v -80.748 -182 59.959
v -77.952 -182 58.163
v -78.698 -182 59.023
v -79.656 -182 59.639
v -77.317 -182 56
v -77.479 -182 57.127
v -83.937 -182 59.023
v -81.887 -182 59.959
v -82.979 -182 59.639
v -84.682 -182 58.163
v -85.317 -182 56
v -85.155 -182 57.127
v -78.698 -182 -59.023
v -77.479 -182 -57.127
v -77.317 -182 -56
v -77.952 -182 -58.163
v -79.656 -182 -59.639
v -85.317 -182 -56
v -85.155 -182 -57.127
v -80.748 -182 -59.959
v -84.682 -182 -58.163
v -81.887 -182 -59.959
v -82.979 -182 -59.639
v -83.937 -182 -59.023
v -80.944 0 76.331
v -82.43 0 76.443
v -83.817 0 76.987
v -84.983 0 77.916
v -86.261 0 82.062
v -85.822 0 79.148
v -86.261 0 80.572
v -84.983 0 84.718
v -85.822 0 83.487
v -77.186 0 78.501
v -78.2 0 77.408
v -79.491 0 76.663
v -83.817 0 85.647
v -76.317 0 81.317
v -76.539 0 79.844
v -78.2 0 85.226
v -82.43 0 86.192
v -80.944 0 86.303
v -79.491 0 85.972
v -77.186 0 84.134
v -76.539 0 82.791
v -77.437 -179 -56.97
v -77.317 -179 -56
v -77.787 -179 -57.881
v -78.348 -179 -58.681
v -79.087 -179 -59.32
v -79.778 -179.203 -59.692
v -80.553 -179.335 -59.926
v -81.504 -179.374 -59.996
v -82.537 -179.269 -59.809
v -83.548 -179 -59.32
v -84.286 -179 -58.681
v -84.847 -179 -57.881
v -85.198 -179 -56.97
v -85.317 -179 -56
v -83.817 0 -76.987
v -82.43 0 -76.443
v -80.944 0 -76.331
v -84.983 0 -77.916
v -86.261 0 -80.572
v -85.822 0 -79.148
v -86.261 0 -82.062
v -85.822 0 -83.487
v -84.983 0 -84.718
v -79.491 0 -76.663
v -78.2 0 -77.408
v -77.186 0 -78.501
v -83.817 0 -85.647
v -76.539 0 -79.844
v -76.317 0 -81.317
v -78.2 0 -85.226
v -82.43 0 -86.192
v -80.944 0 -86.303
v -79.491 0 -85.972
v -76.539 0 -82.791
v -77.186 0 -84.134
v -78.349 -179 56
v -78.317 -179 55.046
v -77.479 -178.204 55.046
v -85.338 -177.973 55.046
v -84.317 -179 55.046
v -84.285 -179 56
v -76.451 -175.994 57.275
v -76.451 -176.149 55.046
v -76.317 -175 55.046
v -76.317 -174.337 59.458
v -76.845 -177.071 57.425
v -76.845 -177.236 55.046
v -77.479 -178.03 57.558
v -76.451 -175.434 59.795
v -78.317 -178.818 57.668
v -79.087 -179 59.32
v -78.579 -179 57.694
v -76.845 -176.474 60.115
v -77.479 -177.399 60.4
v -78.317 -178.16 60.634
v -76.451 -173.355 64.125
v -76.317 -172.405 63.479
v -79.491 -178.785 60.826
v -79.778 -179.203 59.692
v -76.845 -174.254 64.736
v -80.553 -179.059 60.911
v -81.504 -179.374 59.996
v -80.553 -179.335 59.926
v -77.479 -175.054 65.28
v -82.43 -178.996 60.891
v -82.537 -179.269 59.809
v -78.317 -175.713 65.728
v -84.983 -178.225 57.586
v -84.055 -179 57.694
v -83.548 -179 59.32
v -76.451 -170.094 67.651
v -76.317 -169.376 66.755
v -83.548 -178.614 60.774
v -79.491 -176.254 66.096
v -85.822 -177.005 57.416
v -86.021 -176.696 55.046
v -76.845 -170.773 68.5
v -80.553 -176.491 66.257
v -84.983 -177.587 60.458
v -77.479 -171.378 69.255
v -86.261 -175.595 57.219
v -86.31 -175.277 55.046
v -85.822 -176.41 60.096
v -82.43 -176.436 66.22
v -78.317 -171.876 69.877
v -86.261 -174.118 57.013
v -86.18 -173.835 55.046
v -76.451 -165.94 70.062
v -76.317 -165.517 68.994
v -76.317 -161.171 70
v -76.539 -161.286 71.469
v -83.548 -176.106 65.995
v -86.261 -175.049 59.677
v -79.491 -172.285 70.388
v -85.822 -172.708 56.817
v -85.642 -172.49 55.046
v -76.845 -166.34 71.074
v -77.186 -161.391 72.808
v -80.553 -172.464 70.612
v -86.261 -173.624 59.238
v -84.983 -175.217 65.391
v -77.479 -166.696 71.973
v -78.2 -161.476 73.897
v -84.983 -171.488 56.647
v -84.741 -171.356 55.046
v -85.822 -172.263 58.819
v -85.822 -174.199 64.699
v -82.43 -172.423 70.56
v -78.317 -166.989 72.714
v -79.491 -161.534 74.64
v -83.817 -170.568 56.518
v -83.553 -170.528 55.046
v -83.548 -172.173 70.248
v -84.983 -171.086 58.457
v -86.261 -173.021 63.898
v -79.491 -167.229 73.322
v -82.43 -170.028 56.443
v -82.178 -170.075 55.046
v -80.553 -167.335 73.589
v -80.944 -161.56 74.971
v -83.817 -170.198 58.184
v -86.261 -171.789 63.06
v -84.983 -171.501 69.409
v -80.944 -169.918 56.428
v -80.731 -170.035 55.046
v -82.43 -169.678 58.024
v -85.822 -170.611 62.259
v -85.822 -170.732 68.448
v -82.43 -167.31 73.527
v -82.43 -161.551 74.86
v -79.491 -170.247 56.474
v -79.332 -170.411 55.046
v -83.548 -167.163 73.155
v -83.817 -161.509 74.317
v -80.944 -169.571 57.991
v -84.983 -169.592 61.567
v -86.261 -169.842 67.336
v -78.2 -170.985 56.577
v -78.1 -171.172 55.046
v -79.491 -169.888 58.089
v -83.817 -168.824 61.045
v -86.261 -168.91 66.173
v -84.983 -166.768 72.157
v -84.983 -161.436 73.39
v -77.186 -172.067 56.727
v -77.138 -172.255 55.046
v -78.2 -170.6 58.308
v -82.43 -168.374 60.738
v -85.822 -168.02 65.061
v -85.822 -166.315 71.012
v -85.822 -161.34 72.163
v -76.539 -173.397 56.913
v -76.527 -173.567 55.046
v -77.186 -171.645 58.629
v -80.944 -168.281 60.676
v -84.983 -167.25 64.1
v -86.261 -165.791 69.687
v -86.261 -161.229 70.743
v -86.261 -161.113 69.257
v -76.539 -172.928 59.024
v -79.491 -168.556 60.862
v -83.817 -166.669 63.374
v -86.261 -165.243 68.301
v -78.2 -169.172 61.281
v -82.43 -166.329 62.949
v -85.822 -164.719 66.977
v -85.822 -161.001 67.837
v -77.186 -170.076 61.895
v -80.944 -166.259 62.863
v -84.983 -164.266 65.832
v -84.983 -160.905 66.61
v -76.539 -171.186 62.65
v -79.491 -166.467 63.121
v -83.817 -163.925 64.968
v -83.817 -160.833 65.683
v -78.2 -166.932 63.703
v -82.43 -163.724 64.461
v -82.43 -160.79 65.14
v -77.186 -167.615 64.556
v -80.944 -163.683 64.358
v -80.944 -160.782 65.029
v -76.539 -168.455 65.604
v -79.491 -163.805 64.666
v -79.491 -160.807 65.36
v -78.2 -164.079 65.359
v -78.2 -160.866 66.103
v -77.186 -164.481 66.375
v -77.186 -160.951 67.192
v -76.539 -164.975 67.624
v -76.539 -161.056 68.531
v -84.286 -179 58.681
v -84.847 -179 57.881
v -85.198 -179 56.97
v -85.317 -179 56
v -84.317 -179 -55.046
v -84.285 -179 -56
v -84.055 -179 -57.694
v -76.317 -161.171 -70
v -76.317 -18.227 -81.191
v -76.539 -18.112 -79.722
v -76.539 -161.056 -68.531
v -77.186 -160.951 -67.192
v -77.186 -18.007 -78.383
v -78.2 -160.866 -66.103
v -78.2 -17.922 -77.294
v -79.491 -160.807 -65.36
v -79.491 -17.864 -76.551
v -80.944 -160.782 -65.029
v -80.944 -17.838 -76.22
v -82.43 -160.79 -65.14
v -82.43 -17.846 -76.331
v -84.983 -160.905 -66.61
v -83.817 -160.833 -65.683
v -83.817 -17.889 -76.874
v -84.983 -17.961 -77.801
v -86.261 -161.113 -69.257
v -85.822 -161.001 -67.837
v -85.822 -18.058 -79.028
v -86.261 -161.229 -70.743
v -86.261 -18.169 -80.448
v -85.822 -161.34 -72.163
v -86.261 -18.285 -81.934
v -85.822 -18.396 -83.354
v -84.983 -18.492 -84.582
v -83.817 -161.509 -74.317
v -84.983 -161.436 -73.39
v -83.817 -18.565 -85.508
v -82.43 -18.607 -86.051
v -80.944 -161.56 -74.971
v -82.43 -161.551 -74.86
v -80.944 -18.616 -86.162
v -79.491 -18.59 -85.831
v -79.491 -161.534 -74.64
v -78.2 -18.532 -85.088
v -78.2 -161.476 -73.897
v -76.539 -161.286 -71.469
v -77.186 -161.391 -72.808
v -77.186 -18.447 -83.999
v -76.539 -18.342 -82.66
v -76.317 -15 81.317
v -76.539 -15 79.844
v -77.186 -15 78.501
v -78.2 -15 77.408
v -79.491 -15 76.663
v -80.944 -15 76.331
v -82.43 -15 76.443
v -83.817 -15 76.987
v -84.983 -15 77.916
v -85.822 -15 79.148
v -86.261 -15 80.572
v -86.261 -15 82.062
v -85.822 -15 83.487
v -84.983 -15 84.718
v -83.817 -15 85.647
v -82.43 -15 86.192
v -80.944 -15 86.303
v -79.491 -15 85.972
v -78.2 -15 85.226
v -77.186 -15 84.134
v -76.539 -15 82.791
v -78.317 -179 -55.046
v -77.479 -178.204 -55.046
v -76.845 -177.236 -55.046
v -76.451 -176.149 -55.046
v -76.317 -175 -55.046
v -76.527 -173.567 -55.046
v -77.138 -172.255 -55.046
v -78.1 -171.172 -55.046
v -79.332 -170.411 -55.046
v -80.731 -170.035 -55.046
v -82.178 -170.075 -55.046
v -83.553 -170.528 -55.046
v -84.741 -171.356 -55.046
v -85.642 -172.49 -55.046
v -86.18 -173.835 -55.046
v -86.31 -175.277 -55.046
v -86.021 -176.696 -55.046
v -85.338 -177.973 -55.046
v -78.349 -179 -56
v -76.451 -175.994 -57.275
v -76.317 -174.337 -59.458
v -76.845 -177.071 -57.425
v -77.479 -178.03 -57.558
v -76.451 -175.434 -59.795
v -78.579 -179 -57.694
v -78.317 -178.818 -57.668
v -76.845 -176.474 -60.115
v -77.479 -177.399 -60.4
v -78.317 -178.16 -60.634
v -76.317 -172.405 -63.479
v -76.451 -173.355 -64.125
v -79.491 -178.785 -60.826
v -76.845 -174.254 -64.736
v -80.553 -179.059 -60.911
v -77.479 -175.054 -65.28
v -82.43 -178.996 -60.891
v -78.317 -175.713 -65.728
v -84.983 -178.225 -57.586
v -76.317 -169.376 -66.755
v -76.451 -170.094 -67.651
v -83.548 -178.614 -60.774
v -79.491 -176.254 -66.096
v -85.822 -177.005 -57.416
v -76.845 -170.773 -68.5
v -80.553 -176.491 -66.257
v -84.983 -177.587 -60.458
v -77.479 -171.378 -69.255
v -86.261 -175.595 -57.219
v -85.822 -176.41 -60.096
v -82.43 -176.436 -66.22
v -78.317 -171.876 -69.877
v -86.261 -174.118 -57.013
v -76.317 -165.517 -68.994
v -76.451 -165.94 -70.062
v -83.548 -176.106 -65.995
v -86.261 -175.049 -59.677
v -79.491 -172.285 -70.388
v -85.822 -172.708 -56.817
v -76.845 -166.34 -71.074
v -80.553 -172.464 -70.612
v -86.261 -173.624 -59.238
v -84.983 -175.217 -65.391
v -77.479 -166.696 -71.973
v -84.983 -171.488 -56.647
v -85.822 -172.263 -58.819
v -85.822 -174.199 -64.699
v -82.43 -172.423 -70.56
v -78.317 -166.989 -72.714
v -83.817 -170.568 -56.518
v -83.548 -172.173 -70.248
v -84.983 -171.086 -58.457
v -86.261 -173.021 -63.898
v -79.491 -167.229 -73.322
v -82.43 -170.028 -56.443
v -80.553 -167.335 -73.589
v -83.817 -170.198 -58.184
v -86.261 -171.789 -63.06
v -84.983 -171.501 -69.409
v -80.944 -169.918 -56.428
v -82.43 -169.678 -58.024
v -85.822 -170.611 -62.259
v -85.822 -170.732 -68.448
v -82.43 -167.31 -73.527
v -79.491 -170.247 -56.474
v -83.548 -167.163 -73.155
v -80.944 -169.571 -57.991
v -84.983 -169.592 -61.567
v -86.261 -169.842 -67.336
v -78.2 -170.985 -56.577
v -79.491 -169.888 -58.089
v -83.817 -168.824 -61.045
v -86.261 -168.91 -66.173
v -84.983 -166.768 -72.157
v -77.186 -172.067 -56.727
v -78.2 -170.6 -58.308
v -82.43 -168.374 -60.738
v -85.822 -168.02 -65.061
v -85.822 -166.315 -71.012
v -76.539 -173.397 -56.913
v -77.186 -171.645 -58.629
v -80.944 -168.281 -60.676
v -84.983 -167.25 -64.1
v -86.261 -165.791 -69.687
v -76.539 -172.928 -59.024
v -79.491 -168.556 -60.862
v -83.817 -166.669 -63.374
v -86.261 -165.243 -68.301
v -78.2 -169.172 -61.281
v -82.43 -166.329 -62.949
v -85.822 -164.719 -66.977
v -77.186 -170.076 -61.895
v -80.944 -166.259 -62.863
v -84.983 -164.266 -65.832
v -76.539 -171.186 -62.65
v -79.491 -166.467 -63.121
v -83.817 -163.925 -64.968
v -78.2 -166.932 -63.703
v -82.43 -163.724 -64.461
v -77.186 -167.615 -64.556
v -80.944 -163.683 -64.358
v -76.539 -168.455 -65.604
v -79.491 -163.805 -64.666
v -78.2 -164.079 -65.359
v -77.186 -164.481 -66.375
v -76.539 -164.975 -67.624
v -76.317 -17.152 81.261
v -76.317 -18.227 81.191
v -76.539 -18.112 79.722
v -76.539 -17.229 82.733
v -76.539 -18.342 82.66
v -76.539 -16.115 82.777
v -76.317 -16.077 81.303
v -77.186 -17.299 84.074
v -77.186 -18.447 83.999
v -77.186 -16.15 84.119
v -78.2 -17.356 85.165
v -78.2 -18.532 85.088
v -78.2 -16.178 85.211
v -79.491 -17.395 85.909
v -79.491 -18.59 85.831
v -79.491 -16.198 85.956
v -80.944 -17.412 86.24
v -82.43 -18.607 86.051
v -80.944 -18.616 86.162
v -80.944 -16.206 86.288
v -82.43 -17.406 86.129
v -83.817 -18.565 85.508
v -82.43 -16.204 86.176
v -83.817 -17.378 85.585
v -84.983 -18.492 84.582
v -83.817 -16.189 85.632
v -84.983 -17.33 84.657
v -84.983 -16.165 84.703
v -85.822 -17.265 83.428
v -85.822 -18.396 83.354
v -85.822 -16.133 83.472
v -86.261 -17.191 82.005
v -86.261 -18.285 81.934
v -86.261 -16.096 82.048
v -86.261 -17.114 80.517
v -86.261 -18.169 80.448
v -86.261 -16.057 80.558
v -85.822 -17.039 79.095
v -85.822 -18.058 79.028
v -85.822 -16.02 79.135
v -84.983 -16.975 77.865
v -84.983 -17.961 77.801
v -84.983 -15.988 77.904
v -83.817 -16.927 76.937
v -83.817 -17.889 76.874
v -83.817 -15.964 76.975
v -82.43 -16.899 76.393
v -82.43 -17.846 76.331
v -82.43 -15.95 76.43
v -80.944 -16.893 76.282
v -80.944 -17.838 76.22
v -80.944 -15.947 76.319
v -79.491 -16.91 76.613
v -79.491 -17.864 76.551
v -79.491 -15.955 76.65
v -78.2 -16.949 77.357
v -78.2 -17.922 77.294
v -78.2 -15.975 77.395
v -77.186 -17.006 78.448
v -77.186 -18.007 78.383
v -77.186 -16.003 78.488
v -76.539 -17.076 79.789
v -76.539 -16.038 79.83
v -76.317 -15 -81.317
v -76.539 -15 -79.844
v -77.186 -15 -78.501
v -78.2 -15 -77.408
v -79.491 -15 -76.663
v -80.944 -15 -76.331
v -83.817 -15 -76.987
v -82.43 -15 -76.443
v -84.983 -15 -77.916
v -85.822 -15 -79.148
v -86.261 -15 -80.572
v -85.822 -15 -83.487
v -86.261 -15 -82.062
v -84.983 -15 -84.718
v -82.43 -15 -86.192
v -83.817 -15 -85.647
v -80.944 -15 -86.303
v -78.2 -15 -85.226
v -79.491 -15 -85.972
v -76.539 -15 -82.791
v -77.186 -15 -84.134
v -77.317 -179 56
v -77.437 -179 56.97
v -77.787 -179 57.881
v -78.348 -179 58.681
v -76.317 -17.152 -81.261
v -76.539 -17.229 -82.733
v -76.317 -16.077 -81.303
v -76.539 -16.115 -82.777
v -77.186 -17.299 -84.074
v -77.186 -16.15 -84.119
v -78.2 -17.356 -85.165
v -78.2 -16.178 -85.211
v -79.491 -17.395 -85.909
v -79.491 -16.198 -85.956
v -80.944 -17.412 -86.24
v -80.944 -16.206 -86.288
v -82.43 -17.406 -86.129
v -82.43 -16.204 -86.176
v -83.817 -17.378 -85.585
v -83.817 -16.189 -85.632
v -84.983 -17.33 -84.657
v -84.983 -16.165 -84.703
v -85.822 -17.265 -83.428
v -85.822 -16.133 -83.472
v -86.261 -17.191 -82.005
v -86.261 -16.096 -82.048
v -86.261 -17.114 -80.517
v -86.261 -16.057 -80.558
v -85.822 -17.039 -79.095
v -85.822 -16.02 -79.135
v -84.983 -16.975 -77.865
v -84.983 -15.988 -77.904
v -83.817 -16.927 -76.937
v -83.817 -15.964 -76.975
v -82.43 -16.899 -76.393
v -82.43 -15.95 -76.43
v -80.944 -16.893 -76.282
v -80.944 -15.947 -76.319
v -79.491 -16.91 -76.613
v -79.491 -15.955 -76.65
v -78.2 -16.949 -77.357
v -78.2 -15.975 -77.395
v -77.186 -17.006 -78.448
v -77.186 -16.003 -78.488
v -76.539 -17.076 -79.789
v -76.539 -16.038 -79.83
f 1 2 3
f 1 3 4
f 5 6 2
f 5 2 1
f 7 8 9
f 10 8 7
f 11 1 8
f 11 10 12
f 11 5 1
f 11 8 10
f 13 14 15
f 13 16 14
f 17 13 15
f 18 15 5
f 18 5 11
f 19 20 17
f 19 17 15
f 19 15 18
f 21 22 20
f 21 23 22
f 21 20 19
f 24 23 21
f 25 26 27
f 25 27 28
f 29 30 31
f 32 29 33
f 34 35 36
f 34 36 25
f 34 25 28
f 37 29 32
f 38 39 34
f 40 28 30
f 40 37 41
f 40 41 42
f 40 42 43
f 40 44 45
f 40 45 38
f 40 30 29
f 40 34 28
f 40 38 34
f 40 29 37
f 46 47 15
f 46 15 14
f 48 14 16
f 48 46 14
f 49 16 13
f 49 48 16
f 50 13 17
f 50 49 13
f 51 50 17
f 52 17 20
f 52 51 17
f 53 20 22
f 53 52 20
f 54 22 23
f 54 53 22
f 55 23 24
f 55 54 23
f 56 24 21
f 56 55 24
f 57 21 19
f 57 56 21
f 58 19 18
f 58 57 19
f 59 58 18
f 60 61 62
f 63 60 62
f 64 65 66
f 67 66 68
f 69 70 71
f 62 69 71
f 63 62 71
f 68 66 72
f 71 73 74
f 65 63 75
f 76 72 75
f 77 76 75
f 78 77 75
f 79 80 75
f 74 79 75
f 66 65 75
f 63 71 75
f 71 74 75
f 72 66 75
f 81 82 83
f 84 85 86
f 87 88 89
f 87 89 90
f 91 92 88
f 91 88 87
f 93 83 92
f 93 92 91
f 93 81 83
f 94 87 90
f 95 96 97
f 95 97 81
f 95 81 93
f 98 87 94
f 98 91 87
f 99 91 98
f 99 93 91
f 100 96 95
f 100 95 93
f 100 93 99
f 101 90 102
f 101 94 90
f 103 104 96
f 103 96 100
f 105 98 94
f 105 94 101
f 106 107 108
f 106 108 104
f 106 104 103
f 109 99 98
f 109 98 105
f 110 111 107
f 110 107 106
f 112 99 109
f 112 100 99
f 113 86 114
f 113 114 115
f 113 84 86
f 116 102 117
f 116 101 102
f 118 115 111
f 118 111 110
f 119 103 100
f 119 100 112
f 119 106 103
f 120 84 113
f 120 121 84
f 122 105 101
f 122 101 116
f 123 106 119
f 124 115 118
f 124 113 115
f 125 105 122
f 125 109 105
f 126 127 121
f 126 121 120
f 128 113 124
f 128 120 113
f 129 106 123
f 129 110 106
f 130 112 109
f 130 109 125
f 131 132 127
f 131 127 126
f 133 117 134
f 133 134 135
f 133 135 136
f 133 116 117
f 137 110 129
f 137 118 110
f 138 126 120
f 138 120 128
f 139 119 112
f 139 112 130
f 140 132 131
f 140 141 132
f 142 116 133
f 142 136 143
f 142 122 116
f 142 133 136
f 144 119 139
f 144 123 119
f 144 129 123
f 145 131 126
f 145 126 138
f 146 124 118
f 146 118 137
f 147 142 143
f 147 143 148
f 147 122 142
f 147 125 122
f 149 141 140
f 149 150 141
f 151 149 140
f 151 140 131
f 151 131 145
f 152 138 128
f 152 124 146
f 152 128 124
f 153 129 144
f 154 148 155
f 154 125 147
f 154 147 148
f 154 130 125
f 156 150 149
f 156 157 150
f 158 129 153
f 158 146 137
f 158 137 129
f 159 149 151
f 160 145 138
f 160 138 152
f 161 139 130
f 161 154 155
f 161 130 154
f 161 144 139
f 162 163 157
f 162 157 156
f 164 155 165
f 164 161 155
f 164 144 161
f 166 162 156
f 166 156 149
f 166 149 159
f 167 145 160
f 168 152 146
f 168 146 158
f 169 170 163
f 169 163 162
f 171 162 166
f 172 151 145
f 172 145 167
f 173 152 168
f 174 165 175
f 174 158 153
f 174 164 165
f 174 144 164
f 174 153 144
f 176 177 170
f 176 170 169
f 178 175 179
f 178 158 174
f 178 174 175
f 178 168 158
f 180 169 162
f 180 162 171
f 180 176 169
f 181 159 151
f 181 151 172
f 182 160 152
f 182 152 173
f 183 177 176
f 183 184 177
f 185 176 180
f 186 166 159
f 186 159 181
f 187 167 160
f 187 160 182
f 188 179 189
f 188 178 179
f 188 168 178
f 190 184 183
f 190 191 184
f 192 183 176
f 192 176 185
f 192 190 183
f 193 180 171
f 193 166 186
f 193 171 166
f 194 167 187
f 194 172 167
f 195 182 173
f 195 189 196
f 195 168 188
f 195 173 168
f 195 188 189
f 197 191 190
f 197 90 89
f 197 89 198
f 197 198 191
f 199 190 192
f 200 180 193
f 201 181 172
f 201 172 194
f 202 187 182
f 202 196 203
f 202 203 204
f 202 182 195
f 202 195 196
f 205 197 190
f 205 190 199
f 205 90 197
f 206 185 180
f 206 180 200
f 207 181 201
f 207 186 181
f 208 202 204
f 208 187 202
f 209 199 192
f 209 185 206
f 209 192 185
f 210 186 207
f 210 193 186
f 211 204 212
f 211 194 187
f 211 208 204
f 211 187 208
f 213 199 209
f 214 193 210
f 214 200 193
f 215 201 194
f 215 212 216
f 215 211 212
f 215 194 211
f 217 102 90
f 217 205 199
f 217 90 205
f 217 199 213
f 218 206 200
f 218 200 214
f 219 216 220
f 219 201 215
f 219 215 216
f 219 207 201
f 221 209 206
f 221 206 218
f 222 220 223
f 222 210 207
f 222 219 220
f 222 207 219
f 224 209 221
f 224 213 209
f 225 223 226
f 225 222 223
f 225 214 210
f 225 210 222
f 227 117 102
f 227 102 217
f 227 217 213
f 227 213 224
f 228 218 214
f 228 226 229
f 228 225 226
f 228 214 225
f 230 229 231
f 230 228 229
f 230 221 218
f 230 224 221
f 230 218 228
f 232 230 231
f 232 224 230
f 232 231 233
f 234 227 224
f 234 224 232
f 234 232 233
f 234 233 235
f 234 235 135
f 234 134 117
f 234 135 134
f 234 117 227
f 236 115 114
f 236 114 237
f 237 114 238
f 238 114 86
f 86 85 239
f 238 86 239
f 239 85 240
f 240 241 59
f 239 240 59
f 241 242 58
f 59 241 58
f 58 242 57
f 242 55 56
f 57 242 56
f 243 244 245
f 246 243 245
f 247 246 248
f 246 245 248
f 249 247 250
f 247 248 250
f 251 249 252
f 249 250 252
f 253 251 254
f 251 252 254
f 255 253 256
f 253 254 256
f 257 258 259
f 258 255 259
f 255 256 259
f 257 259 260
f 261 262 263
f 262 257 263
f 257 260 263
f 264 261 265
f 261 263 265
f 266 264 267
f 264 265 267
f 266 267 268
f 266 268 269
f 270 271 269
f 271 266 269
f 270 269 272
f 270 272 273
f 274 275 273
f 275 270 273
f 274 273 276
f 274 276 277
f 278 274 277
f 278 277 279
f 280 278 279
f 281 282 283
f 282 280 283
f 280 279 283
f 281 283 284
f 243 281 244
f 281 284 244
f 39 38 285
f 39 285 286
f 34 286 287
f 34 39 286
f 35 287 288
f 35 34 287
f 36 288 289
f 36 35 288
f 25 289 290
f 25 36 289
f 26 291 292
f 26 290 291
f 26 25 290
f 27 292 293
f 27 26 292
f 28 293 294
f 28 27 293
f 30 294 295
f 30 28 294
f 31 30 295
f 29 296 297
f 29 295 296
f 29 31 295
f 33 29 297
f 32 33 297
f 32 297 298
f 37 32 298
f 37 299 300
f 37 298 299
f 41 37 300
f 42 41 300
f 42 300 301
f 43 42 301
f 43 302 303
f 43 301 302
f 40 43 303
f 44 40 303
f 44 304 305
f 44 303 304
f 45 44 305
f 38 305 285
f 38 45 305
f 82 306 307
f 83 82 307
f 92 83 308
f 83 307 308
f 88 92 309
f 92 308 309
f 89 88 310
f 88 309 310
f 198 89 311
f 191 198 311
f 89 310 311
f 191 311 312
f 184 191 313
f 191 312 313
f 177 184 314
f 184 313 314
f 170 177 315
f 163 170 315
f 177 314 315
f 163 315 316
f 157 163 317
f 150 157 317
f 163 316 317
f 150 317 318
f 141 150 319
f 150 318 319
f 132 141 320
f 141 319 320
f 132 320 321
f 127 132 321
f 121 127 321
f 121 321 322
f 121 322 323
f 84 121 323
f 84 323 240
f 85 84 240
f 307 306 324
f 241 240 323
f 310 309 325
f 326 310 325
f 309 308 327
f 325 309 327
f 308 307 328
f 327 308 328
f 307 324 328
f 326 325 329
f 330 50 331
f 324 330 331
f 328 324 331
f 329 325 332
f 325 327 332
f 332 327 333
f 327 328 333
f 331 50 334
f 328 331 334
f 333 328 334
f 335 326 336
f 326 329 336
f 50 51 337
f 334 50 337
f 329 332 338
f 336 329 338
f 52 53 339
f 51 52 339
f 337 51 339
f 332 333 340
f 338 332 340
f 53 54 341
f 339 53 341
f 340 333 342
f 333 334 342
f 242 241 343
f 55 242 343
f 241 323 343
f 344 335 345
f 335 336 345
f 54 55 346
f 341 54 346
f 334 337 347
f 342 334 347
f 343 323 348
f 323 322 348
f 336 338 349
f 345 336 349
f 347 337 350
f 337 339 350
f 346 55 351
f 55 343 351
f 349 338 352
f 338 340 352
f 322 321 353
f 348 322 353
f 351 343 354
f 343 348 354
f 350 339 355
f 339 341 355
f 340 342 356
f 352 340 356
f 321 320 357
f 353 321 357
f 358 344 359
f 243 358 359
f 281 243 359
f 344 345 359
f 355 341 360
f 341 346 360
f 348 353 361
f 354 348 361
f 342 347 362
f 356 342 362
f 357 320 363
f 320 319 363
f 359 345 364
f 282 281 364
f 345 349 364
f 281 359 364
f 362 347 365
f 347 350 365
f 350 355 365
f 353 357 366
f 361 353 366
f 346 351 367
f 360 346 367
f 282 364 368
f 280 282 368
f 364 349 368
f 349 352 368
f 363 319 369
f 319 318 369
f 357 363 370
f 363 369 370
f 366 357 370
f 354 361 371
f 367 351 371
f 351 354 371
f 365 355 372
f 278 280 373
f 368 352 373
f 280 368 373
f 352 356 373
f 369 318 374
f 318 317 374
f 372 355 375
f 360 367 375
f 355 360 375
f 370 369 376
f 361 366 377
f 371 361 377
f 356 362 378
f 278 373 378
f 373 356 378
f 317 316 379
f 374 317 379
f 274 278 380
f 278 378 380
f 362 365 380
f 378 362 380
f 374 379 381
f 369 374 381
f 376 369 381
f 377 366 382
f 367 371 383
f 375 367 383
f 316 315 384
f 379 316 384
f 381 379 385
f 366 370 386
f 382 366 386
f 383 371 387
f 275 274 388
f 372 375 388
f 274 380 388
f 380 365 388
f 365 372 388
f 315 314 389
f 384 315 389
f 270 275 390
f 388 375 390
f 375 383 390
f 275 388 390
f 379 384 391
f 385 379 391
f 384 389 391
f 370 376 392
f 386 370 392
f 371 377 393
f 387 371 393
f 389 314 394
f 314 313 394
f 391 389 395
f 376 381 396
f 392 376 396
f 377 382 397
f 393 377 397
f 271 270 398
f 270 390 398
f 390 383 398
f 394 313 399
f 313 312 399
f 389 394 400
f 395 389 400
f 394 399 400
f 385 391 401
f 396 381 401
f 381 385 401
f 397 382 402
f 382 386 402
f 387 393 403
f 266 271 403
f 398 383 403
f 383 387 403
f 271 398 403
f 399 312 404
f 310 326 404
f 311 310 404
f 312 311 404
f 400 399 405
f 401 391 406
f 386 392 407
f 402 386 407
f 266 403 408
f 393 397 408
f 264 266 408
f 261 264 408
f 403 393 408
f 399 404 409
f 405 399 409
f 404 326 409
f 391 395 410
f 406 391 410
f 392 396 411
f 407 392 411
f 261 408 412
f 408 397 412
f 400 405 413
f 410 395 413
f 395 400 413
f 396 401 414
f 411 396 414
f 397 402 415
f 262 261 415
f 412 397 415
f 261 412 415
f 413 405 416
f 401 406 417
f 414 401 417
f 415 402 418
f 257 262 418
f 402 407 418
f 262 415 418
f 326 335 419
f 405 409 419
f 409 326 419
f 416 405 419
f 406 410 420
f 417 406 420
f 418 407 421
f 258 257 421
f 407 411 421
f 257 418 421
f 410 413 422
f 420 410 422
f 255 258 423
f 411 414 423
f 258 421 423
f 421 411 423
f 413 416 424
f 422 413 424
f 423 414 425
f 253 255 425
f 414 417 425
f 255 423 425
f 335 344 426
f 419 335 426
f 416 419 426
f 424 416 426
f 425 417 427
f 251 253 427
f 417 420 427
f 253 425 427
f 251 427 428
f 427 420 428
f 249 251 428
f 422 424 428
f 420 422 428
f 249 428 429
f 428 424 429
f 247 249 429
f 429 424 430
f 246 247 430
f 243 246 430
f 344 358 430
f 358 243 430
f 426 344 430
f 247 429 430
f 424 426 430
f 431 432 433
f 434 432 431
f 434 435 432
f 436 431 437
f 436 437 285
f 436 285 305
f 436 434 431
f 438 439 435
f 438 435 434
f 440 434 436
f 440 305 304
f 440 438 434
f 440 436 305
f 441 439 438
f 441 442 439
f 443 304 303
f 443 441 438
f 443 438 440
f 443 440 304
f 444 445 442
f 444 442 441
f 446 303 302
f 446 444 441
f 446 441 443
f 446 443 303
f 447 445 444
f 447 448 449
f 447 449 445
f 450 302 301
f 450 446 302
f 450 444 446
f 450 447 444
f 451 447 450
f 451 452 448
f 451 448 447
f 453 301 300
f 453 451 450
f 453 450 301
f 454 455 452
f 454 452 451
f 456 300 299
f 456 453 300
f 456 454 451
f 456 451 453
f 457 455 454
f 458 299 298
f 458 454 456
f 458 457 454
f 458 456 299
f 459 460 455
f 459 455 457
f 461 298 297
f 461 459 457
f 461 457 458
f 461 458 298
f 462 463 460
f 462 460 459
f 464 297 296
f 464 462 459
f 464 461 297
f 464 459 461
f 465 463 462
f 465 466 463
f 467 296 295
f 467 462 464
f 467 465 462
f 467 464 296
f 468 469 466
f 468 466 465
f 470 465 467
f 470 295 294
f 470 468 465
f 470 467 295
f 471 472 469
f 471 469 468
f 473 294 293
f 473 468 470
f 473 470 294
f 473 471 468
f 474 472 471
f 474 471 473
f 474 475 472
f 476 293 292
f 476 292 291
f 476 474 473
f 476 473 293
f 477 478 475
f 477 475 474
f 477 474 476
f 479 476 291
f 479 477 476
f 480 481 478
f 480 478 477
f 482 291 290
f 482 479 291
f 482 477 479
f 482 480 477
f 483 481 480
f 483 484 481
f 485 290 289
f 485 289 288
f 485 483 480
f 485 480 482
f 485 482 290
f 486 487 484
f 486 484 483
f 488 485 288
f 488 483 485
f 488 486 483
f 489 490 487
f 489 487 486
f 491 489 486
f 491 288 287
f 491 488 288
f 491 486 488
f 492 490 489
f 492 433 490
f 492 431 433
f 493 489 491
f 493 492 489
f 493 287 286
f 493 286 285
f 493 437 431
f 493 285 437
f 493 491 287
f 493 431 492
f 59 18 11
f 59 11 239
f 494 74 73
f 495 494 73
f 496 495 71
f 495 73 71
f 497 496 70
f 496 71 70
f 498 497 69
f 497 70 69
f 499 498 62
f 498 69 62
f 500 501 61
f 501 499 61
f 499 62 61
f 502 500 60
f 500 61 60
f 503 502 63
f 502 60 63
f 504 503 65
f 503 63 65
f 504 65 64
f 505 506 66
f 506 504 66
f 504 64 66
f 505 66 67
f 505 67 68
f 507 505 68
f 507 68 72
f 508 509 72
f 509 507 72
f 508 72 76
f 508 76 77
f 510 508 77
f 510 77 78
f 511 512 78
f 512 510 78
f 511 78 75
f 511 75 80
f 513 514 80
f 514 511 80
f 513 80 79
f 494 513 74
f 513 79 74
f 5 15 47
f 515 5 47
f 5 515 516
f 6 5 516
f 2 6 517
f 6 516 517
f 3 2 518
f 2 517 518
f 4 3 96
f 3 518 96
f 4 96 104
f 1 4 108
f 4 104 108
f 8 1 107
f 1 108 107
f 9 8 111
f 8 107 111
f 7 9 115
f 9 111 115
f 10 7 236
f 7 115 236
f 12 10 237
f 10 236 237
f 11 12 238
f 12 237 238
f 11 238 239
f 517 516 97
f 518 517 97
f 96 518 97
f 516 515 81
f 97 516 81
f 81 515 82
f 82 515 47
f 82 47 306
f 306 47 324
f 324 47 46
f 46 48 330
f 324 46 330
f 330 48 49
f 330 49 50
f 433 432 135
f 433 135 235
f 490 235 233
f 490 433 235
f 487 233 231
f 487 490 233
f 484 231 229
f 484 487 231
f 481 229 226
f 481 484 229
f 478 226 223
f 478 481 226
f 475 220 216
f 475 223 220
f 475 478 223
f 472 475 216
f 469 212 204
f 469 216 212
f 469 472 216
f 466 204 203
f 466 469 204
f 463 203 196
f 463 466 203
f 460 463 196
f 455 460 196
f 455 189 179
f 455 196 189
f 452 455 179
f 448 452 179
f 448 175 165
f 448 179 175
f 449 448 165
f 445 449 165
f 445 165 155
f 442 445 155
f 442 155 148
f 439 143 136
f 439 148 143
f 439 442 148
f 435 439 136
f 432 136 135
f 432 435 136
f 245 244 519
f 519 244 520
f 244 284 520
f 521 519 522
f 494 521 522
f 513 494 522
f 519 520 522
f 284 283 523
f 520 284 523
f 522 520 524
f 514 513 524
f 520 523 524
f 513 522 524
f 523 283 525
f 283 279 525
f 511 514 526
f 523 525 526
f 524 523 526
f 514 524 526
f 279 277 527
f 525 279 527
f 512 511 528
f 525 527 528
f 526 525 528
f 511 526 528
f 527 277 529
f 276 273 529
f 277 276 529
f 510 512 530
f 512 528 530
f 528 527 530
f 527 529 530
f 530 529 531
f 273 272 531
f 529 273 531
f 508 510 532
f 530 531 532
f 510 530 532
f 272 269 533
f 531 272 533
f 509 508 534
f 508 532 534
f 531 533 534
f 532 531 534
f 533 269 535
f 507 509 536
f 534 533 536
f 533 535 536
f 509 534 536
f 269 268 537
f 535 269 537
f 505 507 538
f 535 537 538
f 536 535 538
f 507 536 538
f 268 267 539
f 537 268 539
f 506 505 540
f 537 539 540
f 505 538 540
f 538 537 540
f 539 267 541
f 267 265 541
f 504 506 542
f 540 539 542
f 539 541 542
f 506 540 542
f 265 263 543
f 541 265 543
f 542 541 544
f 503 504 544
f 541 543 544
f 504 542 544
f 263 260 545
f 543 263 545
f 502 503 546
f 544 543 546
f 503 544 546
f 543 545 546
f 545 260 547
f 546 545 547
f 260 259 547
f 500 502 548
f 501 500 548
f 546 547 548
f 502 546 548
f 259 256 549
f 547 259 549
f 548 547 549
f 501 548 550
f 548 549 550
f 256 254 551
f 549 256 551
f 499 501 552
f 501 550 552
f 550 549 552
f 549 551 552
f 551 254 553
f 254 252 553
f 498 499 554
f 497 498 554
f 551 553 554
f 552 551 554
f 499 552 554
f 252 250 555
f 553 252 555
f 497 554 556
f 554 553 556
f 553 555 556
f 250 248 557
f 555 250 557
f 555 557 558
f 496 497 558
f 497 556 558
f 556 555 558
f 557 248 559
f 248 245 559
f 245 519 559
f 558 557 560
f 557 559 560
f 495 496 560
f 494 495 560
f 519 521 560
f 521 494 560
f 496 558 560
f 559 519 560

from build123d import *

# Parameters (mm, degrees)
SKETCH4_R                = 5
BOSS_EXTRUDE2_DEPTH      = 56
BOSS_EXTRUDE2_DEPTH_BACK = 56
SKETCH5_W                = 8
SKETCH5_H                = 3
SKETCH6_W                = 4
SKETCH6_H                = 3
REVOLVE1_ANGLE           = 180


with BuildPart() as part:
    # Sweep7: sweep along a path in Sketch2
    with BuildLine(Plane(origin=(-81.317279836, 0, 0), x_dir=(0, 0, -1), z_dir=(1, 0, 0))) as sweep7_path:
        Line((0, -175), (-55.045760302, -175))
        ThreePointArc((-55.045760302, -175), (-65.230021906, -171.012756947), (-70, -161.170775411))
        Line((-70, -161.170775411), (-81.191157553, -18.226833323))
        ThreePointArc((-81.191157553, -18.226833323), (-81.285737233, -16.614648578), (-81.317279836, -15))
        Line((-81.317279836, -15), (-81.317279836, 0))
    # Sketch4 → Sweep7 (sweep)
    with BuildSketch(Plane.XY):
        with Locations((-81.317279836, -175)):
            Circle(SKETCH4_R)
    sweep7 = sweep(path=sweep7_path.line)

    # Mirror2: Sweep7 across plane
    add(sweep7.mirror(Plane.XY))

    # Sketch5 → Boss-Extrude2 (add, two sides: drawn at the far end of the back side and taken through both)
    with BuildSketch(Plane.XY.offset(-BOSS_EXTRUDE2_DEPTH_BACK)):
        with Locations((-81.317279836, -180.5)):
            Rectangle(SKETCH5_W, SKETCH5_H)
    extrude(amount=BOSS_EXTRUDE2_DEPTH + BOSS_EXTRUDE2_DEPTH_BACK)

    # Sketch6 → Revolve1 (revolve)
    with BuildSketch(Plane.XY.offset(56)):
        with Locations((-79.317279836, -180.5)):
            Rectangle(SKETCH6_W, SKETCH6_H)
    revolve1 = revolve(axis=Axis((-81.317279836, -182, 56), (0, -1, 0)), revolution_arc=REVOLVE1_ANGLE)

    # Mirror3: Revolve1 across plane
    add(revolve1.mirror(Plane.XY))


solid = part.part
